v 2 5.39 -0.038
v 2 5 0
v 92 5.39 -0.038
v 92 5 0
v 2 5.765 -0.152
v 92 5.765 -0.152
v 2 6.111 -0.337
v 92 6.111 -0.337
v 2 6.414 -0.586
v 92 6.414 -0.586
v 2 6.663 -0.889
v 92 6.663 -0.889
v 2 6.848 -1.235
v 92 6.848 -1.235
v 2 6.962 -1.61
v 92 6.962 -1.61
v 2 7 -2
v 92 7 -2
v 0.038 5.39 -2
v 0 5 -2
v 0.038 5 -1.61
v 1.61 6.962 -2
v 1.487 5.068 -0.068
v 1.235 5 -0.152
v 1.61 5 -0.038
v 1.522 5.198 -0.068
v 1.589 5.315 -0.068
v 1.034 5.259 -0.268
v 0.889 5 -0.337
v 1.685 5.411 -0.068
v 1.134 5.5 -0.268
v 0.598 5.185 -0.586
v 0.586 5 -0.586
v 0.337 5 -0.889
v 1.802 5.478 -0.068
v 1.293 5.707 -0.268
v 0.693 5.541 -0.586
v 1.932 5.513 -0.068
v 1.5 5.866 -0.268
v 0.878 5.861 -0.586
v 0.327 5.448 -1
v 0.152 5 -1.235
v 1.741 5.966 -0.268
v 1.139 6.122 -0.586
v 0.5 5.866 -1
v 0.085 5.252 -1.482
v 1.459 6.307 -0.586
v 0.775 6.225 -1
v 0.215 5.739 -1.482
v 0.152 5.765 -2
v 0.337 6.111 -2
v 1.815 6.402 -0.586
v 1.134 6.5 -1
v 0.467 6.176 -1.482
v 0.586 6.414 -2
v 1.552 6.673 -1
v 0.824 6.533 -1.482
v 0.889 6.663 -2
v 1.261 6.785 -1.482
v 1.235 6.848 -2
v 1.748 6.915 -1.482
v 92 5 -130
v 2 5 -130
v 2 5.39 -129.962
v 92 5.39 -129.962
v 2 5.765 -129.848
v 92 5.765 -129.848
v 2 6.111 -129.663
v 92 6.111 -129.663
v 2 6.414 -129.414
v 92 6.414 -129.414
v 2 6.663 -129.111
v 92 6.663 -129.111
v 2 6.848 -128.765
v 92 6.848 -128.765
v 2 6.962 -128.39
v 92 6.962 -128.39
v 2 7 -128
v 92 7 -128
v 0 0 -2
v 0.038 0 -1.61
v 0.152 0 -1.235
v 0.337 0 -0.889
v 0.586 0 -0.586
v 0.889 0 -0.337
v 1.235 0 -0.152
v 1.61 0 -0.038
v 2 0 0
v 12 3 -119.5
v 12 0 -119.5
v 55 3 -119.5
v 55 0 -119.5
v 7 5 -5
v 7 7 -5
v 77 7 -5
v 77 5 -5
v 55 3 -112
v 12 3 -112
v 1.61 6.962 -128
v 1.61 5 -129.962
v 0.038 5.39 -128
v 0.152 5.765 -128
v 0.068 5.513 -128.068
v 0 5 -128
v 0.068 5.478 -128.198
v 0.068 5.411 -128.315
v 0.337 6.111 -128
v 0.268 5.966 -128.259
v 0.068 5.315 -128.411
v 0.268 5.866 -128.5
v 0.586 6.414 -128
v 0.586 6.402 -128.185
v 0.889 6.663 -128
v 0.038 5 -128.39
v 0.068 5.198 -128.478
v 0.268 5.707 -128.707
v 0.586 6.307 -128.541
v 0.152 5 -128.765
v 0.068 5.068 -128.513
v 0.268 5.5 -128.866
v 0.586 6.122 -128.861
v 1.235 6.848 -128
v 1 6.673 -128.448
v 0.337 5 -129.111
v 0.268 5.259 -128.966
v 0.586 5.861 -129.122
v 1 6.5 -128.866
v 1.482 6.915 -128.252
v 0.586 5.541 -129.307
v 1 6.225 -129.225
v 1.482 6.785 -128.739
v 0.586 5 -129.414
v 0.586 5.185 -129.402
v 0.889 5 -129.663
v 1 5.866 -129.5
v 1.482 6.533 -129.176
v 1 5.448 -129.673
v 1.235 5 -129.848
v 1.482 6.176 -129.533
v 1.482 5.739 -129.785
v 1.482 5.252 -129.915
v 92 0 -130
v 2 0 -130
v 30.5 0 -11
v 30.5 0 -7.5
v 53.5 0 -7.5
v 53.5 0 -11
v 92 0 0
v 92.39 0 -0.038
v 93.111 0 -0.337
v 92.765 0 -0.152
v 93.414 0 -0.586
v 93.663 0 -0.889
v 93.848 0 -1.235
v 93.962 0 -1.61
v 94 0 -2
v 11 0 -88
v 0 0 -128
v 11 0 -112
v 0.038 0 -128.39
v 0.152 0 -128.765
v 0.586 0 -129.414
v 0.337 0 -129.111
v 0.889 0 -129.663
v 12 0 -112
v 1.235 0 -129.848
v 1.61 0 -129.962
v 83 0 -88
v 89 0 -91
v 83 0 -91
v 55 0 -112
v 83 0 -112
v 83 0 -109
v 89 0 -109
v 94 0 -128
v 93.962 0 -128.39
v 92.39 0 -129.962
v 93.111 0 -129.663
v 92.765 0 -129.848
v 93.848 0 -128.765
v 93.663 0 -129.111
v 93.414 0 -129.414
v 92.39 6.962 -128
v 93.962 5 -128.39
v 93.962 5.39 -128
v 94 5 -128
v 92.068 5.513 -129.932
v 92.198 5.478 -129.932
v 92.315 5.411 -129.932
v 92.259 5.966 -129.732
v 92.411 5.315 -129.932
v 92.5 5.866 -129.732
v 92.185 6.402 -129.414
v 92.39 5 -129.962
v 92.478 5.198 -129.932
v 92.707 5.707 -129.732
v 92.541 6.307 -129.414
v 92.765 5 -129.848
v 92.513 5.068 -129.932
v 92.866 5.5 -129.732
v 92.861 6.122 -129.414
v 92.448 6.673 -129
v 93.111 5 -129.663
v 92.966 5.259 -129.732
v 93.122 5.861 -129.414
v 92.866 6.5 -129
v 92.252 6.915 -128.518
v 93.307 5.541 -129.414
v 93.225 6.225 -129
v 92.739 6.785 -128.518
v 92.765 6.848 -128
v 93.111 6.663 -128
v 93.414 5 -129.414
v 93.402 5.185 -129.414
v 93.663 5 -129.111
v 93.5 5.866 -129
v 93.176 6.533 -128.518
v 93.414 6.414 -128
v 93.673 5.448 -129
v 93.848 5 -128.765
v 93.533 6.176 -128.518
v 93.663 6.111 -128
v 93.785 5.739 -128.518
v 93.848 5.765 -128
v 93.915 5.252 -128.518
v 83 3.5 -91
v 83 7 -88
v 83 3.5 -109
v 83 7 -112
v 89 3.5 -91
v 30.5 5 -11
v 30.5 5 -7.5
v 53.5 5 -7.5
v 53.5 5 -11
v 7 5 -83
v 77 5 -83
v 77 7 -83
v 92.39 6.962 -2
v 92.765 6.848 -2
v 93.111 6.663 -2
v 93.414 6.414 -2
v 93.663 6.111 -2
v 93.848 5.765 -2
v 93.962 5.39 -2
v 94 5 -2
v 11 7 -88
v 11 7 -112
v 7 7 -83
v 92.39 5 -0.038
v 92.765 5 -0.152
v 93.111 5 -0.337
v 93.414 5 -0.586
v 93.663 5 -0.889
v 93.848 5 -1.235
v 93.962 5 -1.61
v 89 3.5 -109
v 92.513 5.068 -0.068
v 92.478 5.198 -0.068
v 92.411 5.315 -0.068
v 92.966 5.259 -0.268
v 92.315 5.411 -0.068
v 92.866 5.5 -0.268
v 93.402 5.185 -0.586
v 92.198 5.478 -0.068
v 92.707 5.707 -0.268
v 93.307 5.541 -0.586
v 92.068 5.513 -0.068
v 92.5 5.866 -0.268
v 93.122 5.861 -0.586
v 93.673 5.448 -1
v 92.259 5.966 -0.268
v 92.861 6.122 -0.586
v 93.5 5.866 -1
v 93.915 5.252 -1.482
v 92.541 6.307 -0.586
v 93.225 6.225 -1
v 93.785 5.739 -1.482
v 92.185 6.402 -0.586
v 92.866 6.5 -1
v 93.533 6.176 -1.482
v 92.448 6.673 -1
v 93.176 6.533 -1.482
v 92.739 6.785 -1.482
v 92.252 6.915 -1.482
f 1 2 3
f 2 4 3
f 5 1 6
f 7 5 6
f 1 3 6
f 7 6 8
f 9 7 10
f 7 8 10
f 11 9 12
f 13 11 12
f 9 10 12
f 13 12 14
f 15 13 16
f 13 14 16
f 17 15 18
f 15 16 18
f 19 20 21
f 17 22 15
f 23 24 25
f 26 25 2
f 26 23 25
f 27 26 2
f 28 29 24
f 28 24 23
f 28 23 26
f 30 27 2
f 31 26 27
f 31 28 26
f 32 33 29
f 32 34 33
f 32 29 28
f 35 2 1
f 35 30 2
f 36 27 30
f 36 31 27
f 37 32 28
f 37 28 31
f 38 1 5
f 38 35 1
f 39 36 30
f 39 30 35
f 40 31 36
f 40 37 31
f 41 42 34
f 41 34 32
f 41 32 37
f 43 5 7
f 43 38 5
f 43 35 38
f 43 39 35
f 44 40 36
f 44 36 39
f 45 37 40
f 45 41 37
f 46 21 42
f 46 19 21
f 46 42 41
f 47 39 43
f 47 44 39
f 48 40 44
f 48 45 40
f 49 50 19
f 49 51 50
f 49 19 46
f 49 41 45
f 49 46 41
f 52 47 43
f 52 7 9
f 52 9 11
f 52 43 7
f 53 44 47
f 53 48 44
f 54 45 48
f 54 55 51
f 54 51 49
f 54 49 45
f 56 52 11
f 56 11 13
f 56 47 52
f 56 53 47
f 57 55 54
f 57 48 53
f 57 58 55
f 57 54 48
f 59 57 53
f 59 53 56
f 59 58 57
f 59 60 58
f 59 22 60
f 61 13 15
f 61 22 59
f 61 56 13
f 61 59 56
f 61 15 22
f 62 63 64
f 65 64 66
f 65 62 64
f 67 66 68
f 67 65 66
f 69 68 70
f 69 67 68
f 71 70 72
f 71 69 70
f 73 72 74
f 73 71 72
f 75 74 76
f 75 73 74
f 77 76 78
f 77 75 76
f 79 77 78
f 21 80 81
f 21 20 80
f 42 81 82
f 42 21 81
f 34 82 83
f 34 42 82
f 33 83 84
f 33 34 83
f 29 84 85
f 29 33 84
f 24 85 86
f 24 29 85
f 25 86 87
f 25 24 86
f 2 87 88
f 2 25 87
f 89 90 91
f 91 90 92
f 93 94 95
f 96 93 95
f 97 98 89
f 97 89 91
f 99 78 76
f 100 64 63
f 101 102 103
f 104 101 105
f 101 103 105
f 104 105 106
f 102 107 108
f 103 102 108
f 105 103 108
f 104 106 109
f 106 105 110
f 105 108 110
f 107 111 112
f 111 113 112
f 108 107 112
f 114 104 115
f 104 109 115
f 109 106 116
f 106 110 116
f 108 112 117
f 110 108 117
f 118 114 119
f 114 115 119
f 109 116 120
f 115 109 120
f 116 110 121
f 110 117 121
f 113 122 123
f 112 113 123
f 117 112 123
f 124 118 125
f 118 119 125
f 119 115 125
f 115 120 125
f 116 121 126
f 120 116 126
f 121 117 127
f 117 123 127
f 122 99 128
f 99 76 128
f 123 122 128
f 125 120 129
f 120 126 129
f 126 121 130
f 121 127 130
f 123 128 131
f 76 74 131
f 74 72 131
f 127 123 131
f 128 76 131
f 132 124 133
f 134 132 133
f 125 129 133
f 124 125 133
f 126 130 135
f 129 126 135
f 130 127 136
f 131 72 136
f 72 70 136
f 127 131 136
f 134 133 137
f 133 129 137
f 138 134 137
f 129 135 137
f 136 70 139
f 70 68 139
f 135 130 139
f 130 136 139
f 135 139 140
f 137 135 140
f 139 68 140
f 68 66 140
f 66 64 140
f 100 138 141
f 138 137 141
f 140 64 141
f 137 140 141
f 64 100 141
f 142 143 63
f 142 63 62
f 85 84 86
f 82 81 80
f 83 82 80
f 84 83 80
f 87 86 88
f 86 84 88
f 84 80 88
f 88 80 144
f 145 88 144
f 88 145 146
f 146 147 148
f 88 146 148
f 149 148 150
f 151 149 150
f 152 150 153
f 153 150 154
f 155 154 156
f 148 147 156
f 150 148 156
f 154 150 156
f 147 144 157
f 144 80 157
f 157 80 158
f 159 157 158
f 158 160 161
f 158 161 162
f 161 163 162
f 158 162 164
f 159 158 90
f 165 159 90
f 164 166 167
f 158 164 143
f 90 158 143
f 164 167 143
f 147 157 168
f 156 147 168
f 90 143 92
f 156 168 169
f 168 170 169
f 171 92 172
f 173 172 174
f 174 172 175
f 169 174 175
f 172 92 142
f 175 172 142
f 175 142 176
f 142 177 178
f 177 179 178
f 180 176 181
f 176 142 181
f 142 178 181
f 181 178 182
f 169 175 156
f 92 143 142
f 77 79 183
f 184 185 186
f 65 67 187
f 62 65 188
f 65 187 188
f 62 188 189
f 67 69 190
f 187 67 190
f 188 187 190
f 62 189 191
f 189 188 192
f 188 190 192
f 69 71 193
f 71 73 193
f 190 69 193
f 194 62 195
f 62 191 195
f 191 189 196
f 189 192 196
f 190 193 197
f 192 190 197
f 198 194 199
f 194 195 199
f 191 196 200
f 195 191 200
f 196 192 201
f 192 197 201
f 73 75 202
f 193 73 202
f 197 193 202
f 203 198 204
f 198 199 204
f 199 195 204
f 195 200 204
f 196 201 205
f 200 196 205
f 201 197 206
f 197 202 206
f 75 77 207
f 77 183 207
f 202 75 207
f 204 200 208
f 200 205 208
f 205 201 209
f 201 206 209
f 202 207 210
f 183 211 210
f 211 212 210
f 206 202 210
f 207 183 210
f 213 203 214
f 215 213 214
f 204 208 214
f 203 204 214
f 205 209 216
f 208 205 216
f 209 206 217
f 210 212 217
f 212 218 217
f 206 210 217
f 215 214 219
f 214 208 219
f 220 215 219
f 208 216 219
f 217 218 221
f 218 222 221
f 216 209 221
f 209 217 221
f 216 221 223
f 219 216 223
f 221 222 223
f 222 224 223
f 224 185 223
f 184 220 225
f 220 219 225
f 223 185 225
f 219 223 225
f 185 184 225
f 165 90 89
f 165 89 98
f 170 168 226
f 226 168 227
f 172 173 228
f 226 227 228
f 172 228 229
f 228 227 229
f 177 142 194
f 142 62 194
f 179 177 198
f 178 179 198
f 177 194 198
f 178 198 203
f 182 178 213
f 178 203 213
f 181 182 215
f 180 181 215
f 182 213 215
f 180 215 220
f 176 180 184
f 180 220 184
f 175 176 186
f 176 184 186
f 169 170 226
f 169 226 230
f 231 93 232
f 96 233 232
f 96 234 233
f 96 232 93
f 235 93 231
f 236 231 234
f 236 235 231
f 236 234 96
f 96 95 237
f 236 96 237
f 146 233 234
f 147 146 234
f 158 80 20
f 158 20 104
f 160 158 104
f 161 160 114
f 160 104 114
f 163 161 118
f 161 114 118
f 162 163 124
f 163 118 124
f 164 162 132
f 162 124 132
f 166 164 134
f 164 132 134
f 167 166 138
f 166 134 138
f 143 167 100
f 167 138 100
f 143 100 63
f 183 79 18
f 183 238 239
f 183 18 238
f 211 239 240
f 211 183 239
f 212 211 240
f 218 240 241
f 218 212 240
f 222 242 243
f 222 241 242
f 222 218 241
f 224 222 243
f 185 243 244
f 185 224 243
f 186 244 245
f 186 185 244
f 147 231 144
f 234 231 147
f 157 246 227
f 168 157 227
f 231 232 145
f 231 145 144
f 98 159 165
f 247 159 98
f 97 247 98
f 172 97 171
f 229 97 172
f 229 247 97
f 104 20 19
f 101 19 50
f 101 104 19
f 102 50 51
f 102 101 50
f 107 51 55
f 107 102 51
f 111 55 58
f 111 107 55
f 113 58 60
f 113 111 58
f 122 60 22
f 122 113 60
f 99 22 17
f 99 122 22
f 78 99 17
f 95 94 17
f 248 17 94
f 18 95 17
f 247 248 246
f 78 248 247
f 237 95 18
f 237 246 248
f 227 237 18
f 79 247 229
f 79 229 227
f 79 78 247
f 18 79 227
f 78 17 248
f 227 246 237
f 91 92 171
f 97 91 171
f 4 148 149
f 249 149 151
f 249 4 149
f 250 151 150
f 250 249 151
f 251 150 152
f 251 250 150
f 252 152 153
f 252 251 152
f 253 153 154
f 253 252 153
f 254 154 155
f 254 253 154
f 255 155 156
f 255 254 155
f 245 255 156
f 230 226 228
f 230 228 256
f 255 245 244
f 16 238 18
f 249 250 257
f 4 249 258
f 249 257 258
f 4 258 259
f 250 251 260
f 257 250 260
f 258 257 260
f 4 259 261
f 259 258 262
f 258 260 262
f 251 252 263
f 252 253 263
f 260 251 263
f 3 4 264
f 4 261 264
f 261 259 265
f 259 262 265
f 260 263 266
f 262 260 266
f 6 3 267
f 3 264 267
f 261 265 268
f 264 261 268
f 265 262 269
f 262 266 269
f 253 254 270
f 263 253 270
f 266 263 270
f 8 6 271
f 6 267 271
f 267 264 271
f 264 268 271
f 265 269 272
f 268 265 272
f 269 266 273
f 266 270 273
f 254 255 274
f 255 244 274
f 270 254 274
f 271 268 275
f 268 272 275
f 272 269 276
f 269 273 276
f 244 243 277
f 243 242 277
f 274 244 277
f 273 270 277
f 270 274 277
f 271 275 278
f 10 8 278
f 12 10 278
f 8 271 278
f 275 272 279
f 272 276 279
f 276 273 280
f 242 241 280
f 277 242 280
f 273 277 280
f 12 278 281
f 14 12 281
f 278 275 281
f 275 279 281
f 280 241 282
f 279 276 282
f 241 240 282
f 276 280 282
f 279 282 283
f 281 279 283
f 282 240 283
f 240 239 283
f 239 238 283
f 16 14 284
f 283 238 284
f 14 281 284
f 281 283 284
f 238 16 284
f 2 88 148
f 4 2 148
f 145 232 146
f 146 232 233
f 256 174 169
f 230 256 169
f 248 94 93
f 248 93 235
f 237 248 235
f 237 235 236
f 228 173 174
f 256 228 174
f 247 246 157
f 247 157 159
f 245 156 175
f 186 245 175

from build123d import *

# Parameters (mm, degrees)
SKETCH1_W           = 94
SKETCH1_H           = 130
BOSS_EXTRUDE1_DEPTH = 7
SKETCH2_W           = 72
SKETCH2_H           = 24
CUT_EXTRUDE1_DEPTH  = 8
SKETCH3_W           = 6
SKETCH3_H           = 18
CUT_EXTRUDE2_DEPTH  = 3.5
SKETCH4_W           = 43
SKETCH4_H           = 7.5
CUT_EXTRUDE3_DEPTH  = 3
SKETCH5_W           = 70
SKETCH5_H           = 78
CUT_EXTRUDE4_DEPTH  = 2
SKETCH6_W           = 23
SKETCH6_H           = 3.5
CUT_EXTRUDE5_DEPTH  = 6
FILLET1_R           = 2


with BuildPart() as part:
    # Sketch1 → Boss-Extrude1 (new body)
    with BuildSketch(Plane(origin=(0, 0, 0), x_dir=(1, 0, 0), z_dir=(0, 1, 0))):
        with Locations((47, 65)):
            Rectangle(SKETCH1_W, SKETCH1_H)
    extrude(amount=BOSS_EXTRUDE1_DEPTH)

    # Sketch2 → Cut-Extrude1 (cut, through all)
    with BuildSketch(Plane(origin=(0, 7, 0), x_dir=(1, 0, 0), z_dir=(0, 1, 0))):
        with Locations((47, 100)):
            Rectangle(SKETCH2_W, SKETCH2_H)
    extrude(amount=-CUT_EXTRUDE1_DEPTH, mode=Mode.SUBTRACT)

    # Sketch3 → Cut-Extrude2 (cut)
    with BuildSketch(Plane.XZ):
        with Locations((86, -100)):
            Rectangle(SKETCH3_W, SKETCH3_H)
    extrude(amount=-CUT_EXTRUDE2_DEPTH, mode=Mode.SUBTRACT)

    # Sketch4 → Cut-Extrude3 (cut)
    with BuildSketch(Plane.XZ):
        with Locations((33.5, -115.75)):
            Rectangle(SKETCH4_W, SKETCH4_H)
    extrude(amount=-CUT_EXTRUDE3_DEPTH, mode=Mode.SUBTRACT)

    # Sketch5 → Cut-Extrude4 (cut)
    with BuildSketch(Plane(origin=(0, 7, 0), x_dir=(1, 0, 0), z_dir=(0, 1, 0))):
        with Locations((42, 44)):
            Rectangle(SKETCH5_W, SKETCH5_H)
    extrude(amount=-CUT_EXTRUDE4_DEPTH, mode=Mode.SUBTRACT)

    # Sketch6 → Cut-Extrude5 (cut, through all)
    with BuildSketch(Plane(origin=(0, 5, 0), x_dir=(1, 0, 0), z_dir=(0, 1, 0))):
        with Locations((42, 9.25)):
            Rectangle(SKETCH6_W, SKETCH6_H)
    extrude(amount=-CUT_EXTRUDE5_DEPTH, mode=Mode.SUBTRACT)

    # Fillet1
    fillet1_edges = [part.edges().sort_by_distance(p)[0] for p in [
        (94, 7, -65),
        (47, 7, -130),
        (0, 7, -65),
        (0, 3.5, -130),
        (94, 3.5, -130),
        (94, 3.5, 0),
        (0, 3.5, 0),
        (47, 7, 0),
    ]]
    fillet(fillet1_edges, radius=FILLET1_R)


solid = part.part
